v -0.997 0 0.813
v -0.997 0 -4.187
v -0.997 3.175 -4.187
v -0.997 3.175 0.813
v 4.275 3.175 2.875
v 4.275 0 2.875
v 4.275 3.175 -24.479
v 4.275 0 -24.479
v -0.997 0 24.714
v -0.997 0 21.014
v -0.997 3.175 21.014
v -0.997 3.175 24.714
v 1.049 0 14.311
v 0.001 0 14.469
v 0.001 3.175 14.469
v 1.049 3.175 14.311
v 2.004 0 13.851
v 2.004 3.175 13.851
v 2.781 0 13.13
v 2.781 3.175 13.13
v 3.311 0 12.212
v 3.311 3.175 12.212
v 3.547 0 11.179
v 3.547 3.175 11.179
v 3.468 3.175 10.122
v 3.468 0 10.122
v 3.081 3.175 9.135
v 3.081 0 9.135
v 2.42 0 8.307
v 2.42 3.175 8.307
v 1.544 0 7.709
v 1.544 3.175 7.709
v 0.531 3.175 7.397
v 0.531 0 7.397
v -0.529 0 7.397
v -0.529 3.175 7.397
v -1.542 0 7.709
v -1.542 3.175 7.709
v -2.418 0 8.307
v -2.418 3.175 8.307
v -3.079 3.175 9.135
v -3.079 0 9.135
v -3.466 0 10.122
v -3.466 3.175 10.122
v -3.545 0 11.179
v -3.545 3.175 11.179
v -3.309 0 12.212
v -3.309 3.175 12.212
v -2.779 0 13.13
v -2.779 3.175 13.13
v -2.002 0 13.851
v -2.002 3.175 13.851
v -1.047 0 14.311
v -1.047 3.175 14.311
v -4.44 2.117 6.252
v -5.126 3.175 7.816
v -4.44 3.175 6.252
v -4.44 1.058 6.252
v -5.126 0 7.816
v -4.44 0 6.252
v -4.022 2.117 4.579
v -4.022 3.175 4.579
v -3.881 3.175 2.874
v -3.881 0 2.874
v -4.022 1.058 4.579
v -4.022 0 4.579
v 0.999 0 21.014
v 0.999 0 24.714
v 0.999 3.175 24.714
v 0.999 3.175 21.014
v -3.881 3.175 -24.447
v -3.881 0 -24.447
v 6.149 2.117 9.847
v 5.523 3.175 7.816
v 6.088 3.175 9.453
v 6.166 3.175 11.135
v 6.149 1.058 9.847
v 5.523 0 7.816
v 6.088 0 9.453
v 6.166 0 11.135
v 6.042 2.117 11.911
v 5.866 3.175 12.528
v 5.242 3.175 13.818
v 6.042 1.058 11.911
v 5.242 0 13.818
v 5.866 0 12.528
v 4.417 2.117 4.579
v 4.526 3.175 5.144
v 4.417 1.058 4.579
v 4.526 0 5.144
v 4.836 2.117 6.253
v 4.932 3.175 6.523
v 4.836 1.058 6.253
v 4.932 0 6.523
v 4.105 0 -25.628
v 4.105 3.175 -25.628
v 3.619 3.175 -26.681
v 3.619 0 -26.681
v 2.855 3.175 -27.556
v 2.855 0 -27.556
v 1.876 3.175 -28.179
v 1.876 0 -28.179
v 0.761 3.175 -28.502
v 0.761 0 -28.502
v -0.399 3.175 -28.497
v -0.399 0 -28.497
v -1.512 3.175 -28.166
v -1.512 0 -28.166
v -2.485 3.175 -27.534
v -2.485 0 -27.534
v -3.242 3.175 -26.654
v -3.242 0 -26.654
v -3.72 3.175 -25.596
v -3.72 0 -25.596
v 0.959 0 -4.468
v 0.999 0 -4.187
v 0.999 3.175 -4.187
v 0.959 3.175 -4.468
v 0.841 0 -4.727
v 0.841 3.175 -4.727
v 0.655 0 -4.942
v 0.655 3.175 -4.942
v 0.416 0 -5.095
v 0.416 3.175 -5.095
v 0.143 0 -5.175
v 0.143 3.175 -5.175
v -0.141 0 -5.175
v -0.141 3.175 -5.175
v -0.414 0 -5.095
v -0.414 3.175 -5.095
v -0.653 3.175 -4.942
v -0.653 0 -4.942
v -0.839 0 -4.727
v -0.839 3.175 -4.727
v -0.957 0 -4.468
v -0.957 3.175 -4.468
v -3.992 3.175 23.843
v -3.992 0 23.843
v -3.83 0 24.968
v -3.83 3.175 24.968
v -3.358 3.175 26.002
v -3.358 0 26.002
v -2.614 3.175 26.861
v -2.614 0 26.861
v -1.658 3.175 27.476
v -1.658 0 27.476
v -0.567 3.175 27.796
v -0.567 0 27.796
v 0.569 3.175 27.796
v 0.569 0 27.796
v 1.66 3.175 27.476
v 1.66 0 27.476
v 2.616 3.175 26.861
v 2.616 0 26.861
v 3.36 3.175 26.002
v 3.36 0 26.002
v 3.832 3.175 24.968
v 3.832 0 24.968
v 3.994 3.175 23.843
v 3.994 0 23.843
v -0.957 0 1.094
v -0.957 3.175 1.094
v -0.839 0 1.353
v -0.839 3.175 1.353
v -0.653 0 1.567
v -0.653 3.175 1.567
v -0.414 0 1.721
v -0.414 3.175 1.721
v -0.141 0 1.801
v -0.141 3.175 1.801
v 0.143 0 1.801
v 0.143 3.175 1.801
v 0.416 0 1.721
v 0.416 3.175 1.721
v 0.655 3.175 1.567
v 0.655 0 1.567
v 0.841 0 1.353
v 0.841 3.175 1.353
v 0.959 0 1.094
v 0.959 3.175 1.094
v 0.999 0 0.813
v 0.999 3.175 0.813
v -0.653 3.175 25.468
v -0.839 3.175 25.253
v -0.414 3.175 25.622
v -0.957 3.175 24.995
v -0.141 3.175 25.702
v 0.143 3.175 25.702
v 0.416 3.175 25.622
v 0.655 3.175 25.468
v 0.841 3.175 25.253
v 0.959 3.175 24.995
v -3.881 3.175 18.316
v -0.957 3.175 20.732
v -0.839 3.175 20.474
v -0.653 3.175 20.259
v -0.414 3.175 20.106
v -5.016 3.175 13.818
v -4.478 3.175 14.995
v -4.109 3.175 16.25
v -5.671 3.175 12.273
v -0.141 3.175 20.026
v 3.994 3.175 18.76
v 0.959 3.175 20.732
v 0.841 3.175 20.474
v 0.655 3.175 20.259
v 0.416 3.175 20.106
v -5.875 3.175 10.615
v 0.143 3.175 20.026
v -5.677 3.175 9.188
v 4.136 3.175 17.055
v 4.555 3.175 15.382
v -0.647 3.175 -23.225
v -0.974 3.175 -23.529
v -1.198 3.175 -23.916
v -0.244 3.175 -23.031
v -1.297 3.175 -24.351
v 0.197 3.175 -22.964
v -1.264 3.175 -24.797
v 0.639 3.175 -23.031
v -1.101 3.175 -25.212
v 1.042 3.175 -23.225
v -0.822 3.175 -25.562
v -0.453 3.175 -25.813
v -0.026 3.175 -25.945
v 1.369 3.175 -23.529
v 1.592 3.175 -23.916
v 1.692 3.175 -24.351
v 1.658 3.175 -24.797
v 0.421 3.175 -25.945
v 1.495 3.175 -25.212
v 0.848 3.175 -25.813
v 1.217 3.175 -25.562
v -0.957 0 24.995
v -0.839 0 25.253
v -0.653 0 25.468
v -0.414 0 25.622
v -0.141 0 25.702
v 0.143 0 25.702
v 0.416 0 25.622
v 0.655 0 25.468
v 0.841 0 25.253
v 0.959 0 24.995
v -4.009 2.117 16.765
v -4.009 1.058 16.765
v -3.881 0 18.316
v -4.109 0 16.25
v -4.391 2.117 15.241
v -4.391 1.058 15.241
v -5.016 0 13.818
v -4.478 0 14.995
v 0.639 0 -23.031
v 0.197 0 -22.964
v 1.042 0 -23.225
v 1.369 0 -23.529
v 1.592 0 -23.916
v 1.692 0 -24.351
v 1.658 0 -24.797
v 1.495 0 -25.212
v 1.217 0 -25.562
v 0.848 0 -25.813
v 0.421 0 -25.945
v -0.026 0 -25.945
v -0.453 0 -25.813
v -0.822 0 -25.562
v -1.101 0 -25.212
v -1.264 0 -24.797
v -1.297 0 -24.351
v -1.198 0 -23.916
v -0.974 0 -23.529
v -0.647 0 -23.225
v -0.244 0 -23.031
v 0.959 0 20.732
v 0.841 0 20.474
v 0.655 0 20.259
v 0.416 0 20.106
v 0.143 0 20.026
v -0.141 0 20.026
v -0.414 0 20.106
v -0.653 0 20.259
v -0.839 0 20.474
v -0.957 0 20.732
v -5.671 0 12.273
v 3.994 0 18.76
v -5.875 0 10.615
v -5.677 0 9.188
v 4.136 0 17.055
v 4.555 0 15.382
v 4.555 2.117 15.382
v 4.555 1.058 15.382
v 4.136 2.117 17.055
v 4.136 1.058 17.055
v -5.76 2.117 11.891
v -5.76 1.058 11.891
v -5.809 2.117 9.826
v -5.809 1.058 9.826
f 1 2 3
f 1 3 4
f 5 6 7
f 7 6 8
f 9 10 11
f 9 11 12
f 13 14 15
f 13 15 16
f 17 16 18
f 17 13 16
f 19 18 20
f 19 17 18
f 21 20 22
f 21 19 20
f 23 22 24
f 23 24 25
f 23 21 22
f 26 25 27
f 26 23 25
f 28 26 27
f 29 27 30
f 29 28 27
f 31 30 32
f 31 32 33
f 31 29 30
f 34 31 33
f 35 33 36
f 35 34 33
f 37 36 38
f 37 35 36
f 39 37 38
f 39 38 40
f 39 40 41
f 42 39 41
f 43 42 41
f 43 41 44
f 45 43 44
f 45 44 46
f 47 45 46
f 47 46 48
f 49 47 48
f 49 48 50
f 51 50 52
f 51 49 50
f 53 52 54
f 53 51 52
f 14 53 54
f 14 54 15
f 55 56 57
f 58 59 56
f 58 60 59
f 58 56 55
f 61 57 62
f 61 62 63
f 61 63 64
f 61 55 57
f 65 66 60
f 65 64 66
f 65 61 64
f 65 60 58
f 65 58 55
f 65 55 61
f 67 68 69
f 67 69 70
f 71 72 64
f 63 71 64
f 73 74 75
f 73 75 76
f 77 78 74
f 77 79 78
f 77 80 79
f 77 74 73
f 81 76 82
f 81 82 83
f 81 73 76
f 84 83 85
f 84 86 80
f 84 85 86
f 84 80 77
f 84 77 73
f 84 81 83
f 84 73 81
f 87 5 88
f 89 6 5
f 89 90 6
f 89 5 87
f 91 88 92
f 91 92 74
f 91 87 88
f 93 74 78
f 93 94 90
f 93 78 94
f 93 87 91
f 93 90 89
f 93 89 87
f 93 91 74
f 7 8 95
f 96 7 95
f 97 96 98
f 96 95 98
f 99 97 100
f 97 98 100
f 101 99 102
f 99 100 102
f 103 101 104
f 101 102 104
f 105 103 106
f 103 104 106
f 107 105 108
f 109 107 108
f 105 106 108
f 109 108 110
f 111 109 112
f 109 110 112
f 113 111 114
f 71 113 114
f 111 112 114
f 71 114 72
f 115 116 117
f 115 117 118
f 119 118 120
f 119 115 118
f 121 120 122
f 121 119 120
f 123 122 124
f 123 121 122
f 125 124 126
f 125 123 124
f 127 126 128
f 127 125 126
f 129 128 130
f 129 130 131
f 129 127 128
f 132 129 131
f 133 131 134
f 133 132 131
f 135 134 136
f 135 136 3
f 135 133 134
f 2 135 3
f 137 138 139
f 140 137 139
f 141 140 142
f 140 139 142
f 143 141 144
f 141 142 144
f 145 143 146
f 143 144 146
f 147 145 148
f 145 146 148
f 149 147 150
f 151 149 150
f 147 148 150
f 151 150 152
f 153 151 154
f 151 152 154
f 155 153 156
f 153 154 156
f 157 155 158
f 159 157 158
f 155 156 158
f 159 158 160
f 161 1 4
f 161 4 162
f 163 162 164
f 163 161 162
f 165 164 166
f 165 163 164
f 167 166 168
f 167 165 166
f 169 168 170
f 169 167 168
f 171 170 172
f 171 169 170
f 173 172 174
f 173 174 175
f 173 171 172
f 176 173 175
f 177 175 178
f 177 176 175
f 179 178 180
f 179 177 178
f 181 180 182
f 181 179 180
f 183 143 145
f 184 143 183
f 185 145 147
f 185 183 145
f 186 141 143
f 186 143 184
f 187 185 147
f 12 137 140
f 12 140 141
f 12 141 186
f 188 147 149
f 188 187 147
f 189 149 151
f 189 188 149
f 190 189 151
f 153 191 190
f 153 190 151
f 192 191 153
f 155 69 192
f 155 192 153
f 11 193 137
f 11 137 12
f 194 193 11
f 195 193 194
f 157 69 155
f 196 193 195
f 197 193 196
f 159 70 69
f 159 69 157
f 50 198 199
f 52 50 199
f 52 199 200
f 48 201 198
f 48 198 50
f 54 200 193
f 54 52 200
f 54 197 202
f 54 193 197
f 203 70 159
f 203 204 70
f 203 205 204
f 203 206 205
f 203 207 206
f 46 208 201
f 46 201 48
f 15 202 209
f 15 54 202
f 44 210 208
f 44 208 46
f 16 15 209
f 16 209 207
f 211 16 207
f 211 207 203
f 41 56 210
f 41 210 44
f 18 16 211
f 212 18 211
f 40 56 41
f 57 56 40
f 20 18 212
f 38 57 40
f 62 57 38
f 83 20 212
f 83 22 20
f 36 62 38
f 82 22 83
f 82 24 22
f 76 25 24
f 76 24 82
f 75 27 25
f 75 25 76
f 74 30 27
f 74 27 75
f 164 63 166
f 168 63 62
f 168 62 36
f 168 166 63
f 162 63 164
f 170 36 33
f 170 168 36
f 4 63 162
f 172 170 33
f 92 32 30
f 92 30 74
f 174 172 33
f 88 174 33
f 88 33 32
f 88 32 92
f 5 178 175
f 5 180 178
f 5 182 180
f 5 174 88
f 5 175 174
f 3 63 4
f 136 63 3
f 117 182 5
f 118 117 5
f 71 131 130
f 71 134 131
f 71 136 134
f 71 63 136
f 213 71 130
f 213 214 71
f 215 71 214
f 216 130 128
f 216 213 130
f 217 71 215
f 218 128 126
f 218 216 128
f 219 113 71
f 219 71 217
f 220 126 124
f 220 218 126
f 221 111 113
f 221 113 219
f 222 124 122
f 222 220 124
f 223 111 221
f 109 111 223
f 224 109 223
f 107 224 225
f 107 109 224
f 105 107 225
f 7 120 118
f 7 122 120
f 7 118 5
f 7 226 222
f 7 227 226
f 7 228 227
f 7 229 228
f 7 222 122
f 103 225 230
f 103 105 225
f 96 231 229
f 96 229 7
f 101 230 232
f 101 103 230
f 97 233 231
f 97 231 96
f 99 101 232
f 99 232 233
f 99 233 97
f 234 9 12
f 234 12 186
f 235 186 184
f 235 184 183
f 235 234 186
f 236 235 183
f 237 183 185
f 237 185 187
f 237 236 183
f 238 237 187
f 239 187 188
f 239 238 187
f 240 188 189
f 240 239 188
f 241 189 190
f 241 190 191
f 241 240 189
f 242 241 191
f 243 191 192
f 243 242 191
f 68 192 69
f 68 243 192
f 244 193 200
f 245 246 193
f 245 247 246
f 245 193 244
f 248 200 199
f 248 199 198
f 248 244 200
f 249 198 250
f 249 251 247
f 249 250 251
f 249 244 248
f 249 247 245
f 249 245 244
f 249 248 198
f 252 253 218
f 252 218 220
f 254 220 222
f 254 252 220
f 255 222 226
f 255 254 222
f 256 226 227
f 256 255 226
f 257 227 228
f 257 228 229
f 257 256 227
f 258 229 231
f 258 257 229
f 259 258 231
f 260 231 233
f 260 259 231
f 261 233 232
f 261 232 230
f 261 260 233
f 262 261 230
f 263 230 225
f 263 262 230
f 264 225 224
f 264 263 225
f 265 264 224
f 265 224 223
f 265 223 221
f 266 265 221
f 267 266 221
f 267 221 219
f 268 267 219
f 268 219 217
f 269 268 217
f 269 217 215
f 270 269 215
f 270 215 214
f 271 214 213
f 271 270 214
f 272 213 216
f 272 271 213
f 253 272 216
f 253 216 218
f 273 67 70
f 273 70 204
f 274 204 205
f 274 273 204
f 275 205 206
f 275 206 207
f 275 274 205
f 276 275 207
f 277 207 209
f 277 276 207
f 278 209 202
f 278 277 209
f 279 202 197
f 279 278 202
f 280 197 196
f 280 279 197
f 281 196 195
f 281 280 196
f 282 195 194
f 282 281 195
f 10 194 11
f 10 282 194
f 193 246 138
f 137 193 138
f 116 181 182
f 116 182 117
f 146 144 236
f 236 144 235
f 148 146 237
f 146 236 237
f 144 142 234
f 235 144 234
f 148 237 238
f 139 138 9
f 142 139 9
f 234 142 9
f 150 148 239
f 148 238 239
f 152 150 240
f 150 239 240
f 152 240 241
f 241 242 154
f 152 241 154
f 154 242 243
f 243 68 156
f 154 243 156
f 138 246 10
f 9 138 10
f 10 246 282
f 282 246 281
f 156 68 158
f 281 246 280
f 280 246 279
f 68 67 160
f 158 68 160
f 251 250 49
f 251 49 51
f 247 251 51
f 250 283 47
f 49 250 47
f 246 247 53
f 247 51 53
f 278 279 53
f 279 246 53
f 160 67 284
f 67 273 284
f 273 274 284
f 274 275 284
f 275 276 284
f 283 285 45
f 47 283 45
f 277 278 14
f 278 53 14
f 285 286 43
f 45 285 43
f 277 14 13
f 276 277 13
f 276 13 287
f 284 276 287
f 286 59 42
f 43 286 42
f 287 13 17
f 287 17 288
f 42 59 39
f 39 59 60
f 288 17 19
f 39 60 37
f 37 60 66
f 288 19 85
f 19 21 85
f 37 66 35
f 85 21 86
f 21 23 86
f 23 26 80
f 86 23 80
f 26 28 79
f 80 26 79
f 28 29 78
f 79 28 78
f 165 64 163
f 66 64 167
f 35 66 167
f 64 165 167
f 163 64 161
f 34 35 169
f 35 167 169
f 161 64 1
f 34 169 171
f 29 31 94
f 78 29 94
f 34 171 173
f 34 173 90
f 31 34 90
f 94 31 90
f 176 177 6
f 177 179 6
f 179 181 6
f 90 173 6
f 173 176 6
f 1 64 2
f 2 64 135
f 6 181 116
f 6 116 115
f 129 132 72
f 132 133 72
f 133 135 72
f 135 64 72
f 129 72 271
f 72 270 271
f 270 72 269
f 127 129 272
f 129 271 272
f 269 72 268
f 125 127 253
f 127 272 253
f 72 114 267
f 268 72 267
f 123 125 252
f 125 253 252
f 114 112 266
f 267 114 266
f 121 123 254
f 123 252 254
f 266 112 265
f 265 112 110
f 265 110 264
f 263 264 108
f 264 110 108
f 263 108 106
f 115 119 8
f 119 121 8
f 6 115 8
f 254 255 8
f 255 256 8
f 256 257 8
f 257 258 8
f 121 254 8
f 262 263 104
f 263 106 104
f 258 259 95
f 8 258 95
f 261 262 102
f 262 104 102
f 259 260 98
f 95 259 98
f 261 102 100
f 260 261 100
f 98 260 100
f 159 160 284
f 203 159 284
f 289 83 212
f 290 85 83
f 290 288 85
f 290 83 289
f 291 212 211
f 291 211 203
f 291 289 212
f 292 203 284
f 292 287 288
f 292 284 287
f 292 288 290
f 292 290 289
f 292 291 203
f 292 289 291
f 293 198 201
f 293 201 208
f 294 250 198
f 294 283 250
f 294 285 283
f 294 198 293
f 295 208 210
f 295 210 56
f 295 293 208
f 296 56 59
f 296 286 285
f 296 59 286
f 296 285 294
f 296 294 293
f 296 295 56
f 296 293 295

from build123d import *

# Parameters (mm, degrees)
SKETCH1_R           = 1.4986
SKETCH1_R_2         = 3.556
BOSS_EXTRUDE2_DEPTH = 3.175


with BuildPart() as part:
    # Sketch1 → Boss-Extrude2 (new body)
    with BuildSketch(Plane(origin=(0, 0, 0), x_dir=(1, 0, 0), z_dir=(0, 1, 0))):
        with BuildLine():
            Line((-3.88054086, 24.446655173), (-3.88054086, -2.874238183))
            add(Edge.make_bspline(
                [(-5.126415425, -7.816187942), (-4.308579975, -6.333908563), (-3.879875529, -4.567729194), (-3.88054086, -2.874238183)],
                knots=[2, 2, 2, 2, 3, 3, 3, 3], degree=3))
            add(Edge.make_bspline(
                [(-5.016324889, -13.818322138), (-6.095643591, -12.023073271), (-6.186493664, -9.73551085), (-5.126415425, -7.816187942)],
                knots=[1.005658807, 1.005658807, 1.005658807, 1.005658807, 2, 2, 2, 2], degree=3))
            add(Edge.make_bspline(
                [(-3.88054086, -18.316067774), (-3.88054086, -16.774680236), (-4.271386719, -15.167168465), (-5.016324889, -13.818322138)],
                knots=[17, 17, 17, 17, 18, 18, 18, 18], degree=3))
            Line((-3.88054086, -18.316067774), (-3.991875118, -23.843497505))
            ThreePointArc((-3.991875118, -23.843497505), (0.001069913, -27.836442536), (3.994014944, -23.843497505))
            Line((3.994014944, -23.843497505), (3.994014944, -18.759718562))
            add(Edge.make_bspline(
                [(5.241762742, -13.818322138), (4.423413244, -15.300216615), (3.994014944, -17.066290901), (3.994014944, -18.759718562)],
                knots=[11, 11, 11, 11, 12, 12, 12, 12], degree=3))
            add(Edge.make_bspline(
                [(5.522924723, -7.816187942), (6.529884526, -9.766435102), (6.373924923, -12.053304327), (5.241762742, -13.818322138)],
                knots=[9, 9, 9, 9, 10, 10, 10, 10], degree=3))
            add(Edge.make_bspline(
                [(4.275176926, -2.874728037), (4.275176926, -4.568219179), (4.704575226, -6.334229984), (5.522924723, -7.816187942)],
                knots=[8, 8, 8, 8, 9, 9, 9, 9], degree=3))
            Line((4.275176926, -2.874728037), (4.275176926, 24.479419578))
            ThreePointArc((4.275176926, 24.479419578), (0.180935831, 28.540896268), (-3.88054086, 24.446655173))
        make_face()
        with Locations(Location((0.197318033, 24.463037376, 0), (0, 0, 270))):
            Circle(SKETCH1_R, mode=Mode.SUBTRACT)
        with Locations(Location((0.001040667, -10.913296245, 0), (0, 0, 270))):
            Circle(SKETCH1_R_2, mode=Mode.SUBTRACT)
        with BuildLine():
            Line((0.999301297, -0.813017652), (0.999301297, 4.187201199))
            ThreePointArc((0.999301297, 4.187201199), (0.001069914, 5.185432583), (-0.99716147, 4.187201199))
            Line((-0.99716147, 4.187201199), (-0.99716147, -0.813017652))
            ThreePointArc((-0.99716147, -0.813017652), (0.001069914, -1.811249036), (0.999301297, -0.813017652))
        make_face(mode=Mode.SUBTRACT)
        with BuildLine():
            Line((0.999301296, -24.713674478), (0.999301296, -21.01357972))
            ThreePointArc((0.999301296, -21.01357972), (0.001069913, -20.015348337), (-0.997161471, -21.01357972))
            Line((-0.997161471, -21.01357972), (-0.997161471, -24.713674478))
            ThreePointArc((-0.997161471, -24.713674478), (0.001069913, -25.711905862), (0.999301296, -24.713674478))
        make_face(mode=Mode.SUBTRACT)
    extrude(amount=BOSS_EXTRUDE2_DEPTH)


solid = part.part
